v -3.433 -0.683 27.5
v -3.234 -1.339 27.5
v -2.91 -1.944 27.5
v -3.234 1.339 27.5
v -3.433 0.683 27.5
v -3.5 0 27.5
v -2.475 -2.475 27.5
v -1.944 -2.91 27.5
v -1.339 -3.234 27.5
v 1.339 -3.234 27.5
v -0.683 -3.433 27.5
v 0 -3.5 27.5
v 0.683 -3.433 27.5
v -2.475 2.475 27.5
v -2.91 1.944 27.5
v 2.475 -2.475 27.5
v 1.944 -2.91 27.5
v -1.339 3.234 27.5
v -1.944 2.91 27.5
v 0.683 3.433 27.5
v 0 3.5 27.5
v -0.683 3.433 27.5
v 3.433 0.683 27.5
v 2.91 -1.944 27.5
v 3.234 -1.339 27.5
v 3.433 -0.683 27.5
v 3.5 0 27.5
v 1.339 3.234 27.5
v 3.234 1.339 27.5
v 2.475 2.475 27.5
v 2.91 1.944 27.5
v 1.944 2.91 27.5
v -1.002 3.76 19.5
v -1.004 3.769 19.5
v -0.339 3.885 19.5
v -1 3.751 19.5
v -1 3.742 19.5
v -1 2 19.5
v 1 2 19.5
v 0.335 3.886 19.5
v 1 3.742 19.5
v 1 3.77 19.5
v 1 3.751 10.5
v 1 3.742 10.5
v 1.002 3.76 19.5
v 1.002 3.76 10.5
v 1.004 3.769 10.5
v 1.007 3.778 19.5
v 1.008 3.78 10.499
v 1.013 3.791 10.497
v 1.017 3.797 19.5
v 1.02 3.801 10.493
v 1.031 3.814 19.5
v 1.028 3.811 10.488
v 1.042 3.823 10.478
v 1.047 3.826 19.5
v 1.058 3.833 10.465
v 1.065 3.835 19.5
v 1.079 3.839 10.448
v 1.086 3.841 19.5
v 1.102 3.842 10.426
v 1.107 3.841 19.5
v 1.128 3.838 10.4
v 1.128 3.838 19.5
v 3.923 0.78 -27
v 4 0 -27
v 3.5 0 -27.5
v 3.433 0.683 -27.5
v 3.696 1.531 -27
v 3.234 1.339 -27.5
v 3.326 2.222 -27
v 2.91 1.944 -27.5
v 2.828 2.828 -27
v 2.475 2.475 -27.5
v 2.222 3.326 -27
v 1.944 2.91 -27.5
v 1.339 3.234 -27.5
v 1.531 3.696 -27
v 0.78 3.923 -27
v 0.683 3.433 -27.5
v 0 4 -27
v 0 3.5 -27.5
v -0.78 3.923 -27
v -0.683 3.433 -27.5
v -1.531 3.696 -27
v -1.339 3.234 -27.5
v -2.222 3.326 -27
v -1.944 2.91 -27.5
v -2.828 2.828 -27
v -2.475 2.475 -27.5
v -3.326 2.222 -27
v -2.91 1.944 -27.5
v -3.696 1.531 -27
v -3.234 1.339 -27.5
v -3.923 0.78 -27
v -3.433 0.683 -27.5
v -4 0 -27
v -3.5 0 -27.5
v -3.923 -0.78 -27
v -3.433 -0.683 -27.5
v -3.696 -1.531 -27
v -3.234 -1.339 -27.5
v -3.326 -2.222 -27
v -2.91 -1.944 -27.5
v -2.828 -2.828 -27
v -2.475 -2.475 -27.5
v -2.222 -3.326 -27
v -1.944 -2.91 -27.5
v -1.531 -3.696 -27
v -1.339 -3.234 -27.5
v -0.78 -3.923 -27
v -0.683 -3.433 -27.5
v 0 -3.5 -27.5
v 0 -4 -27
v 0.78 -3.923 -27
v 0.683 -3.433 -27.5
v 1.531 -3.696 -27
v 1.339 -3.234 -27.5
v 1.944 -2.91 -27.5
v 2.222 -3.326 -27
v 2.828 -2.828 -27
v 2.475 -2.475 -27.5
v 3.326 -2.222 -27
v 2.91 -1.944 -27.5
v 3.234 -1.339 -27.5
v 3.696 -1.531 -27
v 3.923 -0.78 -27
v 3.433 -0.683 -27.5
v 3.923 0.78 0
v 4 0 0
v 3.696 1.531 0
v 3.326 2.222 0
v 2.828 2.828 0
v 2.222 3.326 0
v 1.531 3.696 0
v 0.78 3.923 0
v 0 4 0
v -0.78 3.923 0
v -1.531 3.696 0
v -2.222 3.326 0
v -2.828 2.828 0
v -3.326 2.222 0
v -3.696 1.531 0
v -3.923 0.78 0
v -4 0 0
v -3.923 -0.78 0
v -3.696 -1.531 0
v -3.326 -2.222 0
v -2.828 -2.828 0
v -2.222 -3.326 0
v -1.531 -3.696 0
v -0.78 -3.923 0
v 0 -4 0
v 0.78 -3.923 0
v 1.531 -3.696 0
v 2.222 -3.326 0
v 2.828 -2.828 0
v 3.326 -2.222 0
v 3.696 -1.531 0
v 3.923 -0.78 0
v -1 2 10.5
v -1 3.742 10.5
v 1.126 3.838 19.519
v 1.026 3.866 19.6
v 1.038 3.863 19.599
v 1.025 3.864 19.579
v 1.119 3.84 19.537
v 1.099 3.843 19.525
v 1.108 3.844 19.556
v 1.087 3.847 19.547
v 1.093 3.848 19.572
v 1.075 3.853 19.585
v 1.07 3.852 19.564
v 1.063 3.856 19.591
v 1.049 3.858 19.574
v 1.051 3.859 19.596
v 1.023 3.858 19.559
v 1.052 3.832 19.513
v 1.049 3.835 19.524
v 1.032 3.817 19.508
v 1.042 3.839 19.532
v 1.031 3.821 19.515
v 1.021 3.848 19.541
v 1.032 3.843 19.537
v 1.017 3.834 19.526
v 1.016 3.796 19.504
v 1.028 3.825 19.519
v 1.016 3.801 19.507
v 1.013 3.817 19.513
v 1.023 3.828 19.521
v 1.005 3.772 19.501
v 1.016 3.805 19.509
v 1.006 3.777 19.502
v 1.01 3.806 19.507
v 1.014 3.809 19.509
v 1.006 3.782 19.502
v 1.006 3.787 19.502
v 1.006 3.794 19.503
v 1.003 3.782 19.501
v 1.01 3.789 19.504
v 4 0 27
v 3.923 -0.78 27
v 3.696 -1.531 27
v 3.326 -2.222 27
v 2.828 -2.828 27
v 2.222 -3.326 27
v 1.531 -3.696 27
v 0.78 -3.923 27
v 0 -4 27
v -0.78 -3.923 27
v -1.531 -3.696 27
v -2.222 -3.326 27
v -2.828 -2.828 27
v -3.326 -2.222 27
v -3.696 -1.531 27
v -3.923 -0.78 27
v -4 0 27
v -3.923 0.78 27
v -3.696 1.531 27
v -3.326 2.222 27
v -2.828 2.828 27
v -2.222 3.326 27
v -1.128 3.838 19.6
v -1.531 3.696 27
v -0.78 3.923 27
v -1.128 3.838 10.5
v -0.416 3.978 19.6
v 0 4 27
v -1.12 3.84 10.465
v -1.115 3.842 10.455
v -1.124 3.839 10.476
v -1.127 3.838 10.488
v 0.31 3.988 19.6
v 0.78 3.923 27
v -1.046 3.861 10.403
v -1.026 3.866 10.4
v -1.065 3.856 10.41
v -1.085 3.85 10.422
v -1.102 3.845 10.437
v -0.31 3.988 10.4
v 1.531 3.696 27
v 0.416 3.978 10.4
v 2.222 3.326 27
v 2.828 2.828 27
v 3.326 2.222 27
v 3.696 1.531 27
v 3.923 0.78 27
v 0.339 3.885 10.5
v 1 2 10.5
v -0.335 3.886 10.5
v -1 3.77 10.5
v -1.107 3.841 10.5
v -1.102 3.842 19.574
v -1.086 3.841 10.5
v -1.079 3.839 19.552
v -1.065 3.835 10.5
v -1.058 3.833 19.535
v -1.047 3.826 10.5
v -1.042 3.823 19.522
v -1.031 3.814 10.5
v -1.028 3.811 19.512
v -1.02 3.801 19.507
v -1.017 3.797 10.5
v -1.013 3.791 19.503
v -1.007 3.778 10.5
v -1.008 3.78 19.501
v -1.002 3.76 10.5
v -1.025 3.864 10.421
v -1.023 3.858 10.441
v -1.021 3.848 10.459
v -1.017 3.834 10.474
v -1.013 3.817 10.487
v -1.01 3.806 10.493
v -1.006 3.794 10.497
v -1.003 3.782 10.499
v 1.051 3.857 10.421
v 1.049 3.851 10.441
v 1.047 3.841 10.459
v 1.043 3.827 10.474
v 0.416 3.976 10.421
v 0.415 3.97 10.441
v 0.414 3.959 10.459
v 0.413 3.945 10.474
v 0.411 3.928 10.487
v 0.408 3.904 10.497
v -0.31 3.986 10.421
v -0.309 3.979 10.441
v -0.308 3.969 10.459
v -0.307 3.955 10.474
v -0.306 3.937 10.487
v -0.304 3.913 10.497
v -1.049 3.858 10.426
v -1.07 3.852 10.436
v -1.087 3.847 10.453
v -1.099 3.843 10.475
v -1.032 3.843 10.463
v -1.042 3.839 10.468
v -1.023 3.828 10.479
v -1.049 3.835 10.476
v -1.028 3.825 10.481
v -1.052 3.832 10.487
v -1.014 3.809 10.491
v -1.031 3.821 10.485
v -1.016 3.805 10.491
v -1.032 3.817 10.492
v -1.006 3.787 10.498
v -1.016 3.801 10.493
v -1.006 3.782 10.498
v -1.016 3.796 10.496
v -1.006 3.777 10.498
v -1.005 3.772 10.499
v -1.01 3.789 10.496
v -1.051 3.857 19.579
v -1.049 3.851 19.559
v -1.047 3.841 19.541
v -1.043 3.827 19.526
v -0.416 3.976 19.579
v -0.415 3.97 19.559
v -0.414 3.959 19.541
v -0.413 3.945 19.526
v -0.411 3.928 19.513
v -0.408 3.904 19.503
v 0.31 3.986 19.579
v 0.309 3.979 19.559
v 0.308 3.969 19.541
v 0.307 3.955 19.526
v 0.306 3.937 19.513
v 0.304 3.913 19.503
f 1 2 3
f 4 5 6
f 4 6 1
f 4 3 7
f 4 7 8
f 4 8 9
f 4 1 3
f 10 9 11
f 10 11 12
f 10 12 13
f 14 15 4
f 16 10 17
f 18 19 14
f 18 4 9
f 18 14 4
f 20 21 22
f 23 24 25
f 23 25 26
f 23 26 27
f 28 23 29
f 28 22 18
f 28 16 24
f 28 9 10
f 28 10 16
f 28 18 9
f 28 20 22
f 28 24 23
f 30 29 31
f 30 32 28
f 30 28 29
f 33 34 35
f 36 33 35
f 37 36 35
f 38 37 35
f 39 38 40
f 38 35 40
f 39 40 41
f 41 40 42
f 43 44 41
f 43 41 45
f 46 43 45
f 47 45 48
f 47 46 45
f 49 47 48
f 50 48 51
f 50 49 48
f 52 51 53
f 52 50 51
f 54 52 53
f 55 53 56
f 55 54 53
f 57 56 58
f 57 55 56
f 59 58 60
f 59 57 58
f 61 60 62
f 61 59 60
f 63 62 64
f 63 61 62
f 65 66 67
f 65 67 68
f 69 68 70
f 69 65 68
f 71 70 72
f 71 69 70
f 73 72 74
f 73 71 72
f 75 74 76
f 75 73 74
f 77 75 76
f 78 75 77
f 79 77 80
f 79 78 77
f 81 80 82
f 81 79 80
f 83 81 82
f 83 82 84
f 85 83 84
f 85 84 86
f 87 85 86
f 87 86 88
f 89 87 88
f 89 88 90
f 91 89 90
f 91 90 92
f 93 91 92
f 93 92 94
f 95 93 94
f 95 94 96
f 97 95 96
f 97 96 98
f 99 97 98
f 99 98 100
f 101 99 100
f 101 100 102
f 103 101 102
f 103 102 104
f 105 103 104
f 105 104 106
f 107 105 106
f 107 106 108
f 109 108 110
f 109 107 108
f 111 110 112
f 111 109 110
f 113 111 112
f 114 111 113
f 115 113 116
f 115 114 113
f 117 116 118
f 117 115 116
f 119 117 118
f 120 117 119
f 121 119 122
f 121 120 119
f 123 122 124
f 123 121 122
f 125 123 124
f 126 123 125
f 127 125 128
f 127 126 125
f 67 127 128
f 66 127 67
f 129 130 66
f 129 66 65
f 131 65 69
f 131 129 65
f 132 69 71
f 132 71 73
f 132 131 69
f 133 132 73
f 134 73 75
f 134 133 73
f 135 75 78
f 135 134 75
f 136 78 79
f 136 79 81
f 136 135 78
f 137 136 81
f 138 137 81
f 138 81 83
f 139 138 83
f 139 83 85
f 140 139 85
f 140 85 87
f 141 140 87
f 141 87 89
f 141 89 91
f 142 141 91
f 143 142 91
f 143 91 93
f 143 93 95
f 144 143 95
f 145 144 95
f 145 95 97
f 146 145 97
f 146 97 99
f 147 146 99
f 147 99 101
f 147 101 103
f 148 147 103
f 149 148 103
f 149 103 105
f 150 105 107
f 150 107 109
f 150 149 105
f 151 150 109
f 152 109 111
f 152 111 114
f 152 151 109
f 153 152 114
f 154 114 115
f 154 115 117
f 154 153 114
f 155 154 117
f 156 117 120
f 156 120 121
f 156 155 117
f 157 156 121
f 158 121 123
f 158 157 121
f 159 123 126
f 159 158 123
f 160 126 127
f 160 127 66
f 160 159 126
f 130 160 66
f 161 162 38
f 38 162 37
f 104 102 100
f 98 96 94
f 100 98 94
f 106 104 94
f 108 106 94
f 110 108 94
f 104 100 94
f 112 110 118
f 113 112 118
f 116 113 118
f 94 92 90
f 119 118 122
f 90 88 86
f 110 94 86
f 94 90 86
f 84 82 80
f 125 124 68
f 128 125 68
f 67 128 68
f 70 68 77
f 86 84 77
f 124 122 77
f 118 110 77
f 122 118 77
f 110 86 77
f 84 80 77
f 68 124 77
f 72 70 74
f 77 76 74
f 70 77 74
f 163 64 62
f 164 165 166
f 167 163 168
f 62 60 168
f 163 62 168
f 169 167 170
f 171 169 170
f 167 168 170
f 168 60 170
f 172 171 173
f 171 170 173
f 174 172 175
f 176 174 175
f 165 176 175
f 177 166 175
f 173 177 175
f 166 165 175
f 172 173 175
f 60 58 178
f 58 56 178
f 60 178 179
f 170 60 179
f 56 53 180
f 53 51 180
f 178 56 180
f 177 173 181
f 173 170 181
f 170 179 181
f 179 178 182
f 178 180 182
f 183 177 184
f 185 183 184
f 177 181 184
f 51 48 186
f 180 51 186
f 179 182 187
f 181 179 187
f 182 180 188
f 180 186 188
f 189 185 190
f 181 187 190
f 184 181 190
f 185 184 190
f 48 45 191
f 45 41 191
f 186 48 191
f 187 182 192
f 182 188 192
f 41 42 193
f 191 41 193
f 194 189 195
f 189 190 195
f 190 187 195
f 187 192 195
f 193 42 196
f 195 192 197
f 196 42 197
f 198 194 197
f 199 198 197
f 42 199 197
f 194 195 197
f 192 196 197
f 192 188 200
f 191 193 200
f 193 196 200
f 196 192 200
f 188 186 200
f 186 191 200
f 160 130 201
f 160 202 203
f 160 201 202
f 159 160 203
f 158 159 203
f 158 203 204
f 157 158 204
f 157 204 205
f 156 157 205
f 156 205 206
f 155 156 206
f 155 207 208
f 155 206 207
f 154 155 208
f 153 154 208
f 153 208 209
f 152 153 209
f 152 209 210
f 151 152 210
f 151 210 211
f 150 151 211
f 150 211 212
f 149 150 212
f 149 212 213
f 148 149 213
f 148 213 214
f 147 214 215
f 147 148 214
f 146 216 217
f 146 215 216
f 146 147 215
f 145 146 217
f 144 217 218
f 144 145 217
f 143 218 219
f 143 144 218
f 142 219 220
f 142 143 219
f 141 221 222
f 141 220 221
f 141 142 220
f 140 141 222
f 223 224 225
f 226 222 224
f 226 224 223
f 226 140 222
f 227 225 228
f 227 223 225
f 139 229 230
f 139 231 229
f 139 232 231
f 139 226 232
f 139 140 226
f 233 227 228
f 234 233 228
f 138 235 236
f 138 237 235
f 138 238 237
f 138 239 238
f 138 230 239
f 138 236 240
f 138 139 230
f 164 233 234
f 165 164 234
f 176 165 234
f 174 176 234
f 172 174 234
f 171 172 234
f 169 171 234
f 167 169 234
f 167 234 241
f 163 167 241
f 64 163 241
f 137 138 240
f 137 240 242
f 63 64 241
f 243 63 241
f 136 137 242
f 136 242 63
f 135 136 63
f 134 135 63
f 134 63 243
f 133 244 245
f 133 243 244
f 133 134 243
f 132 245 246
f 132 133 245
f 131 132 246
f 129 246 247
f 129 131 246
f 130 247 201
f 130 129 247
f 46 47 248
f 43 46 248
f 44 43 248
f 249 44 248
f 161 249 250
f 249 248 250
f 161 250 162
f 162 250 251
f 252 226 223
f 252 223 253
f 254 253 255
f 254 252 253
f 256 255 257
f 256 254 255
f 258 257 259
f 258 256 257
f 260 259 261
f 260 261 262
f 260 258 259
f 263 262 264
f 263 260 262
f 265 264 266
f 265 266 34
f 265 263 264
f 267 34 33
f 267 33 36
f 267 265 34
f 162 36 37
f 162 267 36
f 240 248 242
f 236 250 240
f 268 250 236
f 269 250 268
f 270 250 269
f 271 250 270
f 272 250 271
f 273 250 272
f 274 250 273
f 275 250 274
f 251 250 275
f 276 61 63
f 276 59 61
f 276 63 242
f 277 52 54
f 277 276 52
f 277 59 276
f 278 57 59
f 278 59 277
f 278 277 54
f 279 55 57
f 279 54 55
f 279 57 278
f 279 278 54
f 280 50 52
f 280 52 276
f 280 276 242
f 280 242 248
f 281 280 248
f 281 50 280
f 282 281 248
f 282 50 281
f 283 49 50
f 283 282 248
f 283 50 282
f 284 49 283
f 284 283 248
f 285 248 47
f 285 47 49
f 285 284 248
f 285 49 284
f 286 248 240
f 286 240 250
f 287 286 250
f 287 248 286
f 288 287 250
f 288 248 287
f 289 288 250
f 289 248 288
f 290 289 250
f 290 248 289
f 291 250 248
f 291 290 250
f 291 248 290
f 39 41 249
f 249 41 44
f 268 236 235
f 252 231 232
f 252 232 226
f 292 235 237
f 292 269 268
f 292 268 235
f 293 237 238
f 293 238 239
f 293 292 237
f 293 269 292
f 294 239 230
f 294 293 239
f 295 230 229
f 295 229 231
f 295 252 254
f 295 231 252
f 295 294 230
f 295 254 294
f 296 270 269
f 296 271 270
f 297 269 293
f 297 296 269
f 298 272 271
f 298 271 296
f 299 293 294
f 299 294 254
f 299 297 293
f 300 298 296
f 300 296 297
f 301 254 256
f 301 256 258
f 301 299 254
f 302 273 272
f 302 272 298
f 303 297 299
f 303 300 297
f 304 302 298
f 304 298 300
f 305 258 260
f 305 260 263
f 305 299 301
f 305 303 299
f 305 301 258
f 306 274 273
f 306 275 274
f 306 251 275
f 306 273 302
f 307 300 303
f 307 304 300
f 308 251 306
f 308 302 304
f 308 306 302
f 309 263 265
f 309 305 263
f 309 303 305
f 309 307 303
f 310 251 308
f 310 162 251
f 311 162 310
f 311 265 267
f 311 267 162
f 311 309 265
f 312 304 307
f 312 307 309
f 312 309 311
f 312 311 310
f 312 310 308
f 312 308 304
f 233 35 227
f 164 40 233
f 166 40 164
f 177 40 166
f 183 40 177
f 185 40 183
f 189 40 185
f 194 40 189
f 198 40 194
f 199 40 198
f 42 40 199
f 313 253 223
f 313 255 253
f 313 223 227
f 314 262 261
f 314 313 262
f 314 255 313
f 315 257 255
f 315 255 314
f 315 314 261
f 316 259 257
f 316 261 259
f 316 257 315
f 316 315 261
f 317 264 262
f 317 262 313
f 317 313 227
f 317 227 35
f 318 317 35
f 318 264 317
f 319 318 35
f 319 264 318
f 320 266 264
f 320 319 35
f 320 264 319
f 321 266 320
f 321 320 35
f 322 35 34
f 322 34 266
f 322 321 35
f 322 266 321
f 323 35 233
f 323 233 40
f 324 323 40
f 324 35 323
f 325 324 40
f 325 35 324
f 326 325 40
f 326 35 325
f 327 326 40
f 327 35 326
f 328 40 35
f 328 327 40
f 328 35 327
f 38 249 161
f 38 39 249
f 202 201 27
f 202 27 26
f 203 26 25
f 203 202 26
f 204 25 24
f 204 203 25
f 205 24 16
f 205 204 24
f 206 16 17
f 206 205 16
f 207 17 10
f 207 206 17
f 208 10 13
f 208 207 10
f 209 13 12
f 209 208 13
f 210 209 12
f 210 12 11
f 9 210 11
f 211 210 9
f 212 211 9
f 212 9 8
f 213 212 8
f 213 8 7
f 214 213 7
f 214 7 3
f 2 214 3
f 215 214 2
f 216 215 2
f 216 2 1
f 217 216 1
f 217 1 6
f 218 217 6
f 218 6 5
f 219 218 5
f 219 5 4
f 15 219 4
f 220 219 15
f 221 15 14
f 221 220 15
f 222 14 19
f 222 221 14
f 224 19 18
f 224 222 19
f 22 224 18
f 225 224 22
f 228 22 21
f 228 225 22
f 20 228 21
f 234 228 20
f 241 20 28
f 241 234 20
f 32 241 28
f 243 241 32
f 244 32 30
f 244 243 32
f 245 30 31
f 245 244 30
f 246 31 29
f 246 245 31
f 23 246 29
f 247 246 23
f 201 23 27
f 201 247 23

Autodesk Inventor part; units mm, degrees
ref_plane "YZ Plane" through (0, 0, 0) normal (1, 0, 0) x (0, 1, 0)
ref_plane "XY Plane" through (0, 0, 0) normal (0, 0, 1) x (1, 0, 0)
sketch "Sketch1" plane through (0, 0, 0) normal (0, 0, 1) x (1, 0, 0)
  circle A0 centre (0, 0) radius 4
  dimension "d0" = 8
extrude "Extrusion1" add sketch "Sketch1" along normal mid plane 55
chamfer "Chamfer1" distance 0.5 angle 45 2 edges at (-4, 0, 27.5) (-4, 0, -27.5)
ref_plane "Work Plane1" through (0, 4, 0) normal (0, 1, 0) x (-1, 0, 0)
sketch "Sketch2" plane through (0, 4, 0) normal (0, 1, 0) x (-1, 0, 0)
  line L0 (-3.5, 27.5) -> (3.5, 27.5) projected
  line L1 (4, -27) -> (4, 27) projected
  line L2 (1, 19.5) -> (-1, 19.5)
  line L3 (-1, 19.5) -> (-1, 10.5)
  line L4 (-1, 10.5) -> (1, 10.5)
  line L5 (1, 10.5) -> (1, 19.5)
  point P0 (0, 0)
  dimension "d7" = 2
  dimension "d8" = 9
  dimension "d9" = 8
  dimension "d10" = 1
extrude "Extrusion2" cut sketch "Sketch2" against normal blind 2
fillet "Fillet1" radius 0.1 4 edges at (1, 3.873, 15) (0, 4, 10.5) (-1, 3.873, 15) (0, 4, 19.5)
properties part number "asGearbox" material "Stainless Steel"
